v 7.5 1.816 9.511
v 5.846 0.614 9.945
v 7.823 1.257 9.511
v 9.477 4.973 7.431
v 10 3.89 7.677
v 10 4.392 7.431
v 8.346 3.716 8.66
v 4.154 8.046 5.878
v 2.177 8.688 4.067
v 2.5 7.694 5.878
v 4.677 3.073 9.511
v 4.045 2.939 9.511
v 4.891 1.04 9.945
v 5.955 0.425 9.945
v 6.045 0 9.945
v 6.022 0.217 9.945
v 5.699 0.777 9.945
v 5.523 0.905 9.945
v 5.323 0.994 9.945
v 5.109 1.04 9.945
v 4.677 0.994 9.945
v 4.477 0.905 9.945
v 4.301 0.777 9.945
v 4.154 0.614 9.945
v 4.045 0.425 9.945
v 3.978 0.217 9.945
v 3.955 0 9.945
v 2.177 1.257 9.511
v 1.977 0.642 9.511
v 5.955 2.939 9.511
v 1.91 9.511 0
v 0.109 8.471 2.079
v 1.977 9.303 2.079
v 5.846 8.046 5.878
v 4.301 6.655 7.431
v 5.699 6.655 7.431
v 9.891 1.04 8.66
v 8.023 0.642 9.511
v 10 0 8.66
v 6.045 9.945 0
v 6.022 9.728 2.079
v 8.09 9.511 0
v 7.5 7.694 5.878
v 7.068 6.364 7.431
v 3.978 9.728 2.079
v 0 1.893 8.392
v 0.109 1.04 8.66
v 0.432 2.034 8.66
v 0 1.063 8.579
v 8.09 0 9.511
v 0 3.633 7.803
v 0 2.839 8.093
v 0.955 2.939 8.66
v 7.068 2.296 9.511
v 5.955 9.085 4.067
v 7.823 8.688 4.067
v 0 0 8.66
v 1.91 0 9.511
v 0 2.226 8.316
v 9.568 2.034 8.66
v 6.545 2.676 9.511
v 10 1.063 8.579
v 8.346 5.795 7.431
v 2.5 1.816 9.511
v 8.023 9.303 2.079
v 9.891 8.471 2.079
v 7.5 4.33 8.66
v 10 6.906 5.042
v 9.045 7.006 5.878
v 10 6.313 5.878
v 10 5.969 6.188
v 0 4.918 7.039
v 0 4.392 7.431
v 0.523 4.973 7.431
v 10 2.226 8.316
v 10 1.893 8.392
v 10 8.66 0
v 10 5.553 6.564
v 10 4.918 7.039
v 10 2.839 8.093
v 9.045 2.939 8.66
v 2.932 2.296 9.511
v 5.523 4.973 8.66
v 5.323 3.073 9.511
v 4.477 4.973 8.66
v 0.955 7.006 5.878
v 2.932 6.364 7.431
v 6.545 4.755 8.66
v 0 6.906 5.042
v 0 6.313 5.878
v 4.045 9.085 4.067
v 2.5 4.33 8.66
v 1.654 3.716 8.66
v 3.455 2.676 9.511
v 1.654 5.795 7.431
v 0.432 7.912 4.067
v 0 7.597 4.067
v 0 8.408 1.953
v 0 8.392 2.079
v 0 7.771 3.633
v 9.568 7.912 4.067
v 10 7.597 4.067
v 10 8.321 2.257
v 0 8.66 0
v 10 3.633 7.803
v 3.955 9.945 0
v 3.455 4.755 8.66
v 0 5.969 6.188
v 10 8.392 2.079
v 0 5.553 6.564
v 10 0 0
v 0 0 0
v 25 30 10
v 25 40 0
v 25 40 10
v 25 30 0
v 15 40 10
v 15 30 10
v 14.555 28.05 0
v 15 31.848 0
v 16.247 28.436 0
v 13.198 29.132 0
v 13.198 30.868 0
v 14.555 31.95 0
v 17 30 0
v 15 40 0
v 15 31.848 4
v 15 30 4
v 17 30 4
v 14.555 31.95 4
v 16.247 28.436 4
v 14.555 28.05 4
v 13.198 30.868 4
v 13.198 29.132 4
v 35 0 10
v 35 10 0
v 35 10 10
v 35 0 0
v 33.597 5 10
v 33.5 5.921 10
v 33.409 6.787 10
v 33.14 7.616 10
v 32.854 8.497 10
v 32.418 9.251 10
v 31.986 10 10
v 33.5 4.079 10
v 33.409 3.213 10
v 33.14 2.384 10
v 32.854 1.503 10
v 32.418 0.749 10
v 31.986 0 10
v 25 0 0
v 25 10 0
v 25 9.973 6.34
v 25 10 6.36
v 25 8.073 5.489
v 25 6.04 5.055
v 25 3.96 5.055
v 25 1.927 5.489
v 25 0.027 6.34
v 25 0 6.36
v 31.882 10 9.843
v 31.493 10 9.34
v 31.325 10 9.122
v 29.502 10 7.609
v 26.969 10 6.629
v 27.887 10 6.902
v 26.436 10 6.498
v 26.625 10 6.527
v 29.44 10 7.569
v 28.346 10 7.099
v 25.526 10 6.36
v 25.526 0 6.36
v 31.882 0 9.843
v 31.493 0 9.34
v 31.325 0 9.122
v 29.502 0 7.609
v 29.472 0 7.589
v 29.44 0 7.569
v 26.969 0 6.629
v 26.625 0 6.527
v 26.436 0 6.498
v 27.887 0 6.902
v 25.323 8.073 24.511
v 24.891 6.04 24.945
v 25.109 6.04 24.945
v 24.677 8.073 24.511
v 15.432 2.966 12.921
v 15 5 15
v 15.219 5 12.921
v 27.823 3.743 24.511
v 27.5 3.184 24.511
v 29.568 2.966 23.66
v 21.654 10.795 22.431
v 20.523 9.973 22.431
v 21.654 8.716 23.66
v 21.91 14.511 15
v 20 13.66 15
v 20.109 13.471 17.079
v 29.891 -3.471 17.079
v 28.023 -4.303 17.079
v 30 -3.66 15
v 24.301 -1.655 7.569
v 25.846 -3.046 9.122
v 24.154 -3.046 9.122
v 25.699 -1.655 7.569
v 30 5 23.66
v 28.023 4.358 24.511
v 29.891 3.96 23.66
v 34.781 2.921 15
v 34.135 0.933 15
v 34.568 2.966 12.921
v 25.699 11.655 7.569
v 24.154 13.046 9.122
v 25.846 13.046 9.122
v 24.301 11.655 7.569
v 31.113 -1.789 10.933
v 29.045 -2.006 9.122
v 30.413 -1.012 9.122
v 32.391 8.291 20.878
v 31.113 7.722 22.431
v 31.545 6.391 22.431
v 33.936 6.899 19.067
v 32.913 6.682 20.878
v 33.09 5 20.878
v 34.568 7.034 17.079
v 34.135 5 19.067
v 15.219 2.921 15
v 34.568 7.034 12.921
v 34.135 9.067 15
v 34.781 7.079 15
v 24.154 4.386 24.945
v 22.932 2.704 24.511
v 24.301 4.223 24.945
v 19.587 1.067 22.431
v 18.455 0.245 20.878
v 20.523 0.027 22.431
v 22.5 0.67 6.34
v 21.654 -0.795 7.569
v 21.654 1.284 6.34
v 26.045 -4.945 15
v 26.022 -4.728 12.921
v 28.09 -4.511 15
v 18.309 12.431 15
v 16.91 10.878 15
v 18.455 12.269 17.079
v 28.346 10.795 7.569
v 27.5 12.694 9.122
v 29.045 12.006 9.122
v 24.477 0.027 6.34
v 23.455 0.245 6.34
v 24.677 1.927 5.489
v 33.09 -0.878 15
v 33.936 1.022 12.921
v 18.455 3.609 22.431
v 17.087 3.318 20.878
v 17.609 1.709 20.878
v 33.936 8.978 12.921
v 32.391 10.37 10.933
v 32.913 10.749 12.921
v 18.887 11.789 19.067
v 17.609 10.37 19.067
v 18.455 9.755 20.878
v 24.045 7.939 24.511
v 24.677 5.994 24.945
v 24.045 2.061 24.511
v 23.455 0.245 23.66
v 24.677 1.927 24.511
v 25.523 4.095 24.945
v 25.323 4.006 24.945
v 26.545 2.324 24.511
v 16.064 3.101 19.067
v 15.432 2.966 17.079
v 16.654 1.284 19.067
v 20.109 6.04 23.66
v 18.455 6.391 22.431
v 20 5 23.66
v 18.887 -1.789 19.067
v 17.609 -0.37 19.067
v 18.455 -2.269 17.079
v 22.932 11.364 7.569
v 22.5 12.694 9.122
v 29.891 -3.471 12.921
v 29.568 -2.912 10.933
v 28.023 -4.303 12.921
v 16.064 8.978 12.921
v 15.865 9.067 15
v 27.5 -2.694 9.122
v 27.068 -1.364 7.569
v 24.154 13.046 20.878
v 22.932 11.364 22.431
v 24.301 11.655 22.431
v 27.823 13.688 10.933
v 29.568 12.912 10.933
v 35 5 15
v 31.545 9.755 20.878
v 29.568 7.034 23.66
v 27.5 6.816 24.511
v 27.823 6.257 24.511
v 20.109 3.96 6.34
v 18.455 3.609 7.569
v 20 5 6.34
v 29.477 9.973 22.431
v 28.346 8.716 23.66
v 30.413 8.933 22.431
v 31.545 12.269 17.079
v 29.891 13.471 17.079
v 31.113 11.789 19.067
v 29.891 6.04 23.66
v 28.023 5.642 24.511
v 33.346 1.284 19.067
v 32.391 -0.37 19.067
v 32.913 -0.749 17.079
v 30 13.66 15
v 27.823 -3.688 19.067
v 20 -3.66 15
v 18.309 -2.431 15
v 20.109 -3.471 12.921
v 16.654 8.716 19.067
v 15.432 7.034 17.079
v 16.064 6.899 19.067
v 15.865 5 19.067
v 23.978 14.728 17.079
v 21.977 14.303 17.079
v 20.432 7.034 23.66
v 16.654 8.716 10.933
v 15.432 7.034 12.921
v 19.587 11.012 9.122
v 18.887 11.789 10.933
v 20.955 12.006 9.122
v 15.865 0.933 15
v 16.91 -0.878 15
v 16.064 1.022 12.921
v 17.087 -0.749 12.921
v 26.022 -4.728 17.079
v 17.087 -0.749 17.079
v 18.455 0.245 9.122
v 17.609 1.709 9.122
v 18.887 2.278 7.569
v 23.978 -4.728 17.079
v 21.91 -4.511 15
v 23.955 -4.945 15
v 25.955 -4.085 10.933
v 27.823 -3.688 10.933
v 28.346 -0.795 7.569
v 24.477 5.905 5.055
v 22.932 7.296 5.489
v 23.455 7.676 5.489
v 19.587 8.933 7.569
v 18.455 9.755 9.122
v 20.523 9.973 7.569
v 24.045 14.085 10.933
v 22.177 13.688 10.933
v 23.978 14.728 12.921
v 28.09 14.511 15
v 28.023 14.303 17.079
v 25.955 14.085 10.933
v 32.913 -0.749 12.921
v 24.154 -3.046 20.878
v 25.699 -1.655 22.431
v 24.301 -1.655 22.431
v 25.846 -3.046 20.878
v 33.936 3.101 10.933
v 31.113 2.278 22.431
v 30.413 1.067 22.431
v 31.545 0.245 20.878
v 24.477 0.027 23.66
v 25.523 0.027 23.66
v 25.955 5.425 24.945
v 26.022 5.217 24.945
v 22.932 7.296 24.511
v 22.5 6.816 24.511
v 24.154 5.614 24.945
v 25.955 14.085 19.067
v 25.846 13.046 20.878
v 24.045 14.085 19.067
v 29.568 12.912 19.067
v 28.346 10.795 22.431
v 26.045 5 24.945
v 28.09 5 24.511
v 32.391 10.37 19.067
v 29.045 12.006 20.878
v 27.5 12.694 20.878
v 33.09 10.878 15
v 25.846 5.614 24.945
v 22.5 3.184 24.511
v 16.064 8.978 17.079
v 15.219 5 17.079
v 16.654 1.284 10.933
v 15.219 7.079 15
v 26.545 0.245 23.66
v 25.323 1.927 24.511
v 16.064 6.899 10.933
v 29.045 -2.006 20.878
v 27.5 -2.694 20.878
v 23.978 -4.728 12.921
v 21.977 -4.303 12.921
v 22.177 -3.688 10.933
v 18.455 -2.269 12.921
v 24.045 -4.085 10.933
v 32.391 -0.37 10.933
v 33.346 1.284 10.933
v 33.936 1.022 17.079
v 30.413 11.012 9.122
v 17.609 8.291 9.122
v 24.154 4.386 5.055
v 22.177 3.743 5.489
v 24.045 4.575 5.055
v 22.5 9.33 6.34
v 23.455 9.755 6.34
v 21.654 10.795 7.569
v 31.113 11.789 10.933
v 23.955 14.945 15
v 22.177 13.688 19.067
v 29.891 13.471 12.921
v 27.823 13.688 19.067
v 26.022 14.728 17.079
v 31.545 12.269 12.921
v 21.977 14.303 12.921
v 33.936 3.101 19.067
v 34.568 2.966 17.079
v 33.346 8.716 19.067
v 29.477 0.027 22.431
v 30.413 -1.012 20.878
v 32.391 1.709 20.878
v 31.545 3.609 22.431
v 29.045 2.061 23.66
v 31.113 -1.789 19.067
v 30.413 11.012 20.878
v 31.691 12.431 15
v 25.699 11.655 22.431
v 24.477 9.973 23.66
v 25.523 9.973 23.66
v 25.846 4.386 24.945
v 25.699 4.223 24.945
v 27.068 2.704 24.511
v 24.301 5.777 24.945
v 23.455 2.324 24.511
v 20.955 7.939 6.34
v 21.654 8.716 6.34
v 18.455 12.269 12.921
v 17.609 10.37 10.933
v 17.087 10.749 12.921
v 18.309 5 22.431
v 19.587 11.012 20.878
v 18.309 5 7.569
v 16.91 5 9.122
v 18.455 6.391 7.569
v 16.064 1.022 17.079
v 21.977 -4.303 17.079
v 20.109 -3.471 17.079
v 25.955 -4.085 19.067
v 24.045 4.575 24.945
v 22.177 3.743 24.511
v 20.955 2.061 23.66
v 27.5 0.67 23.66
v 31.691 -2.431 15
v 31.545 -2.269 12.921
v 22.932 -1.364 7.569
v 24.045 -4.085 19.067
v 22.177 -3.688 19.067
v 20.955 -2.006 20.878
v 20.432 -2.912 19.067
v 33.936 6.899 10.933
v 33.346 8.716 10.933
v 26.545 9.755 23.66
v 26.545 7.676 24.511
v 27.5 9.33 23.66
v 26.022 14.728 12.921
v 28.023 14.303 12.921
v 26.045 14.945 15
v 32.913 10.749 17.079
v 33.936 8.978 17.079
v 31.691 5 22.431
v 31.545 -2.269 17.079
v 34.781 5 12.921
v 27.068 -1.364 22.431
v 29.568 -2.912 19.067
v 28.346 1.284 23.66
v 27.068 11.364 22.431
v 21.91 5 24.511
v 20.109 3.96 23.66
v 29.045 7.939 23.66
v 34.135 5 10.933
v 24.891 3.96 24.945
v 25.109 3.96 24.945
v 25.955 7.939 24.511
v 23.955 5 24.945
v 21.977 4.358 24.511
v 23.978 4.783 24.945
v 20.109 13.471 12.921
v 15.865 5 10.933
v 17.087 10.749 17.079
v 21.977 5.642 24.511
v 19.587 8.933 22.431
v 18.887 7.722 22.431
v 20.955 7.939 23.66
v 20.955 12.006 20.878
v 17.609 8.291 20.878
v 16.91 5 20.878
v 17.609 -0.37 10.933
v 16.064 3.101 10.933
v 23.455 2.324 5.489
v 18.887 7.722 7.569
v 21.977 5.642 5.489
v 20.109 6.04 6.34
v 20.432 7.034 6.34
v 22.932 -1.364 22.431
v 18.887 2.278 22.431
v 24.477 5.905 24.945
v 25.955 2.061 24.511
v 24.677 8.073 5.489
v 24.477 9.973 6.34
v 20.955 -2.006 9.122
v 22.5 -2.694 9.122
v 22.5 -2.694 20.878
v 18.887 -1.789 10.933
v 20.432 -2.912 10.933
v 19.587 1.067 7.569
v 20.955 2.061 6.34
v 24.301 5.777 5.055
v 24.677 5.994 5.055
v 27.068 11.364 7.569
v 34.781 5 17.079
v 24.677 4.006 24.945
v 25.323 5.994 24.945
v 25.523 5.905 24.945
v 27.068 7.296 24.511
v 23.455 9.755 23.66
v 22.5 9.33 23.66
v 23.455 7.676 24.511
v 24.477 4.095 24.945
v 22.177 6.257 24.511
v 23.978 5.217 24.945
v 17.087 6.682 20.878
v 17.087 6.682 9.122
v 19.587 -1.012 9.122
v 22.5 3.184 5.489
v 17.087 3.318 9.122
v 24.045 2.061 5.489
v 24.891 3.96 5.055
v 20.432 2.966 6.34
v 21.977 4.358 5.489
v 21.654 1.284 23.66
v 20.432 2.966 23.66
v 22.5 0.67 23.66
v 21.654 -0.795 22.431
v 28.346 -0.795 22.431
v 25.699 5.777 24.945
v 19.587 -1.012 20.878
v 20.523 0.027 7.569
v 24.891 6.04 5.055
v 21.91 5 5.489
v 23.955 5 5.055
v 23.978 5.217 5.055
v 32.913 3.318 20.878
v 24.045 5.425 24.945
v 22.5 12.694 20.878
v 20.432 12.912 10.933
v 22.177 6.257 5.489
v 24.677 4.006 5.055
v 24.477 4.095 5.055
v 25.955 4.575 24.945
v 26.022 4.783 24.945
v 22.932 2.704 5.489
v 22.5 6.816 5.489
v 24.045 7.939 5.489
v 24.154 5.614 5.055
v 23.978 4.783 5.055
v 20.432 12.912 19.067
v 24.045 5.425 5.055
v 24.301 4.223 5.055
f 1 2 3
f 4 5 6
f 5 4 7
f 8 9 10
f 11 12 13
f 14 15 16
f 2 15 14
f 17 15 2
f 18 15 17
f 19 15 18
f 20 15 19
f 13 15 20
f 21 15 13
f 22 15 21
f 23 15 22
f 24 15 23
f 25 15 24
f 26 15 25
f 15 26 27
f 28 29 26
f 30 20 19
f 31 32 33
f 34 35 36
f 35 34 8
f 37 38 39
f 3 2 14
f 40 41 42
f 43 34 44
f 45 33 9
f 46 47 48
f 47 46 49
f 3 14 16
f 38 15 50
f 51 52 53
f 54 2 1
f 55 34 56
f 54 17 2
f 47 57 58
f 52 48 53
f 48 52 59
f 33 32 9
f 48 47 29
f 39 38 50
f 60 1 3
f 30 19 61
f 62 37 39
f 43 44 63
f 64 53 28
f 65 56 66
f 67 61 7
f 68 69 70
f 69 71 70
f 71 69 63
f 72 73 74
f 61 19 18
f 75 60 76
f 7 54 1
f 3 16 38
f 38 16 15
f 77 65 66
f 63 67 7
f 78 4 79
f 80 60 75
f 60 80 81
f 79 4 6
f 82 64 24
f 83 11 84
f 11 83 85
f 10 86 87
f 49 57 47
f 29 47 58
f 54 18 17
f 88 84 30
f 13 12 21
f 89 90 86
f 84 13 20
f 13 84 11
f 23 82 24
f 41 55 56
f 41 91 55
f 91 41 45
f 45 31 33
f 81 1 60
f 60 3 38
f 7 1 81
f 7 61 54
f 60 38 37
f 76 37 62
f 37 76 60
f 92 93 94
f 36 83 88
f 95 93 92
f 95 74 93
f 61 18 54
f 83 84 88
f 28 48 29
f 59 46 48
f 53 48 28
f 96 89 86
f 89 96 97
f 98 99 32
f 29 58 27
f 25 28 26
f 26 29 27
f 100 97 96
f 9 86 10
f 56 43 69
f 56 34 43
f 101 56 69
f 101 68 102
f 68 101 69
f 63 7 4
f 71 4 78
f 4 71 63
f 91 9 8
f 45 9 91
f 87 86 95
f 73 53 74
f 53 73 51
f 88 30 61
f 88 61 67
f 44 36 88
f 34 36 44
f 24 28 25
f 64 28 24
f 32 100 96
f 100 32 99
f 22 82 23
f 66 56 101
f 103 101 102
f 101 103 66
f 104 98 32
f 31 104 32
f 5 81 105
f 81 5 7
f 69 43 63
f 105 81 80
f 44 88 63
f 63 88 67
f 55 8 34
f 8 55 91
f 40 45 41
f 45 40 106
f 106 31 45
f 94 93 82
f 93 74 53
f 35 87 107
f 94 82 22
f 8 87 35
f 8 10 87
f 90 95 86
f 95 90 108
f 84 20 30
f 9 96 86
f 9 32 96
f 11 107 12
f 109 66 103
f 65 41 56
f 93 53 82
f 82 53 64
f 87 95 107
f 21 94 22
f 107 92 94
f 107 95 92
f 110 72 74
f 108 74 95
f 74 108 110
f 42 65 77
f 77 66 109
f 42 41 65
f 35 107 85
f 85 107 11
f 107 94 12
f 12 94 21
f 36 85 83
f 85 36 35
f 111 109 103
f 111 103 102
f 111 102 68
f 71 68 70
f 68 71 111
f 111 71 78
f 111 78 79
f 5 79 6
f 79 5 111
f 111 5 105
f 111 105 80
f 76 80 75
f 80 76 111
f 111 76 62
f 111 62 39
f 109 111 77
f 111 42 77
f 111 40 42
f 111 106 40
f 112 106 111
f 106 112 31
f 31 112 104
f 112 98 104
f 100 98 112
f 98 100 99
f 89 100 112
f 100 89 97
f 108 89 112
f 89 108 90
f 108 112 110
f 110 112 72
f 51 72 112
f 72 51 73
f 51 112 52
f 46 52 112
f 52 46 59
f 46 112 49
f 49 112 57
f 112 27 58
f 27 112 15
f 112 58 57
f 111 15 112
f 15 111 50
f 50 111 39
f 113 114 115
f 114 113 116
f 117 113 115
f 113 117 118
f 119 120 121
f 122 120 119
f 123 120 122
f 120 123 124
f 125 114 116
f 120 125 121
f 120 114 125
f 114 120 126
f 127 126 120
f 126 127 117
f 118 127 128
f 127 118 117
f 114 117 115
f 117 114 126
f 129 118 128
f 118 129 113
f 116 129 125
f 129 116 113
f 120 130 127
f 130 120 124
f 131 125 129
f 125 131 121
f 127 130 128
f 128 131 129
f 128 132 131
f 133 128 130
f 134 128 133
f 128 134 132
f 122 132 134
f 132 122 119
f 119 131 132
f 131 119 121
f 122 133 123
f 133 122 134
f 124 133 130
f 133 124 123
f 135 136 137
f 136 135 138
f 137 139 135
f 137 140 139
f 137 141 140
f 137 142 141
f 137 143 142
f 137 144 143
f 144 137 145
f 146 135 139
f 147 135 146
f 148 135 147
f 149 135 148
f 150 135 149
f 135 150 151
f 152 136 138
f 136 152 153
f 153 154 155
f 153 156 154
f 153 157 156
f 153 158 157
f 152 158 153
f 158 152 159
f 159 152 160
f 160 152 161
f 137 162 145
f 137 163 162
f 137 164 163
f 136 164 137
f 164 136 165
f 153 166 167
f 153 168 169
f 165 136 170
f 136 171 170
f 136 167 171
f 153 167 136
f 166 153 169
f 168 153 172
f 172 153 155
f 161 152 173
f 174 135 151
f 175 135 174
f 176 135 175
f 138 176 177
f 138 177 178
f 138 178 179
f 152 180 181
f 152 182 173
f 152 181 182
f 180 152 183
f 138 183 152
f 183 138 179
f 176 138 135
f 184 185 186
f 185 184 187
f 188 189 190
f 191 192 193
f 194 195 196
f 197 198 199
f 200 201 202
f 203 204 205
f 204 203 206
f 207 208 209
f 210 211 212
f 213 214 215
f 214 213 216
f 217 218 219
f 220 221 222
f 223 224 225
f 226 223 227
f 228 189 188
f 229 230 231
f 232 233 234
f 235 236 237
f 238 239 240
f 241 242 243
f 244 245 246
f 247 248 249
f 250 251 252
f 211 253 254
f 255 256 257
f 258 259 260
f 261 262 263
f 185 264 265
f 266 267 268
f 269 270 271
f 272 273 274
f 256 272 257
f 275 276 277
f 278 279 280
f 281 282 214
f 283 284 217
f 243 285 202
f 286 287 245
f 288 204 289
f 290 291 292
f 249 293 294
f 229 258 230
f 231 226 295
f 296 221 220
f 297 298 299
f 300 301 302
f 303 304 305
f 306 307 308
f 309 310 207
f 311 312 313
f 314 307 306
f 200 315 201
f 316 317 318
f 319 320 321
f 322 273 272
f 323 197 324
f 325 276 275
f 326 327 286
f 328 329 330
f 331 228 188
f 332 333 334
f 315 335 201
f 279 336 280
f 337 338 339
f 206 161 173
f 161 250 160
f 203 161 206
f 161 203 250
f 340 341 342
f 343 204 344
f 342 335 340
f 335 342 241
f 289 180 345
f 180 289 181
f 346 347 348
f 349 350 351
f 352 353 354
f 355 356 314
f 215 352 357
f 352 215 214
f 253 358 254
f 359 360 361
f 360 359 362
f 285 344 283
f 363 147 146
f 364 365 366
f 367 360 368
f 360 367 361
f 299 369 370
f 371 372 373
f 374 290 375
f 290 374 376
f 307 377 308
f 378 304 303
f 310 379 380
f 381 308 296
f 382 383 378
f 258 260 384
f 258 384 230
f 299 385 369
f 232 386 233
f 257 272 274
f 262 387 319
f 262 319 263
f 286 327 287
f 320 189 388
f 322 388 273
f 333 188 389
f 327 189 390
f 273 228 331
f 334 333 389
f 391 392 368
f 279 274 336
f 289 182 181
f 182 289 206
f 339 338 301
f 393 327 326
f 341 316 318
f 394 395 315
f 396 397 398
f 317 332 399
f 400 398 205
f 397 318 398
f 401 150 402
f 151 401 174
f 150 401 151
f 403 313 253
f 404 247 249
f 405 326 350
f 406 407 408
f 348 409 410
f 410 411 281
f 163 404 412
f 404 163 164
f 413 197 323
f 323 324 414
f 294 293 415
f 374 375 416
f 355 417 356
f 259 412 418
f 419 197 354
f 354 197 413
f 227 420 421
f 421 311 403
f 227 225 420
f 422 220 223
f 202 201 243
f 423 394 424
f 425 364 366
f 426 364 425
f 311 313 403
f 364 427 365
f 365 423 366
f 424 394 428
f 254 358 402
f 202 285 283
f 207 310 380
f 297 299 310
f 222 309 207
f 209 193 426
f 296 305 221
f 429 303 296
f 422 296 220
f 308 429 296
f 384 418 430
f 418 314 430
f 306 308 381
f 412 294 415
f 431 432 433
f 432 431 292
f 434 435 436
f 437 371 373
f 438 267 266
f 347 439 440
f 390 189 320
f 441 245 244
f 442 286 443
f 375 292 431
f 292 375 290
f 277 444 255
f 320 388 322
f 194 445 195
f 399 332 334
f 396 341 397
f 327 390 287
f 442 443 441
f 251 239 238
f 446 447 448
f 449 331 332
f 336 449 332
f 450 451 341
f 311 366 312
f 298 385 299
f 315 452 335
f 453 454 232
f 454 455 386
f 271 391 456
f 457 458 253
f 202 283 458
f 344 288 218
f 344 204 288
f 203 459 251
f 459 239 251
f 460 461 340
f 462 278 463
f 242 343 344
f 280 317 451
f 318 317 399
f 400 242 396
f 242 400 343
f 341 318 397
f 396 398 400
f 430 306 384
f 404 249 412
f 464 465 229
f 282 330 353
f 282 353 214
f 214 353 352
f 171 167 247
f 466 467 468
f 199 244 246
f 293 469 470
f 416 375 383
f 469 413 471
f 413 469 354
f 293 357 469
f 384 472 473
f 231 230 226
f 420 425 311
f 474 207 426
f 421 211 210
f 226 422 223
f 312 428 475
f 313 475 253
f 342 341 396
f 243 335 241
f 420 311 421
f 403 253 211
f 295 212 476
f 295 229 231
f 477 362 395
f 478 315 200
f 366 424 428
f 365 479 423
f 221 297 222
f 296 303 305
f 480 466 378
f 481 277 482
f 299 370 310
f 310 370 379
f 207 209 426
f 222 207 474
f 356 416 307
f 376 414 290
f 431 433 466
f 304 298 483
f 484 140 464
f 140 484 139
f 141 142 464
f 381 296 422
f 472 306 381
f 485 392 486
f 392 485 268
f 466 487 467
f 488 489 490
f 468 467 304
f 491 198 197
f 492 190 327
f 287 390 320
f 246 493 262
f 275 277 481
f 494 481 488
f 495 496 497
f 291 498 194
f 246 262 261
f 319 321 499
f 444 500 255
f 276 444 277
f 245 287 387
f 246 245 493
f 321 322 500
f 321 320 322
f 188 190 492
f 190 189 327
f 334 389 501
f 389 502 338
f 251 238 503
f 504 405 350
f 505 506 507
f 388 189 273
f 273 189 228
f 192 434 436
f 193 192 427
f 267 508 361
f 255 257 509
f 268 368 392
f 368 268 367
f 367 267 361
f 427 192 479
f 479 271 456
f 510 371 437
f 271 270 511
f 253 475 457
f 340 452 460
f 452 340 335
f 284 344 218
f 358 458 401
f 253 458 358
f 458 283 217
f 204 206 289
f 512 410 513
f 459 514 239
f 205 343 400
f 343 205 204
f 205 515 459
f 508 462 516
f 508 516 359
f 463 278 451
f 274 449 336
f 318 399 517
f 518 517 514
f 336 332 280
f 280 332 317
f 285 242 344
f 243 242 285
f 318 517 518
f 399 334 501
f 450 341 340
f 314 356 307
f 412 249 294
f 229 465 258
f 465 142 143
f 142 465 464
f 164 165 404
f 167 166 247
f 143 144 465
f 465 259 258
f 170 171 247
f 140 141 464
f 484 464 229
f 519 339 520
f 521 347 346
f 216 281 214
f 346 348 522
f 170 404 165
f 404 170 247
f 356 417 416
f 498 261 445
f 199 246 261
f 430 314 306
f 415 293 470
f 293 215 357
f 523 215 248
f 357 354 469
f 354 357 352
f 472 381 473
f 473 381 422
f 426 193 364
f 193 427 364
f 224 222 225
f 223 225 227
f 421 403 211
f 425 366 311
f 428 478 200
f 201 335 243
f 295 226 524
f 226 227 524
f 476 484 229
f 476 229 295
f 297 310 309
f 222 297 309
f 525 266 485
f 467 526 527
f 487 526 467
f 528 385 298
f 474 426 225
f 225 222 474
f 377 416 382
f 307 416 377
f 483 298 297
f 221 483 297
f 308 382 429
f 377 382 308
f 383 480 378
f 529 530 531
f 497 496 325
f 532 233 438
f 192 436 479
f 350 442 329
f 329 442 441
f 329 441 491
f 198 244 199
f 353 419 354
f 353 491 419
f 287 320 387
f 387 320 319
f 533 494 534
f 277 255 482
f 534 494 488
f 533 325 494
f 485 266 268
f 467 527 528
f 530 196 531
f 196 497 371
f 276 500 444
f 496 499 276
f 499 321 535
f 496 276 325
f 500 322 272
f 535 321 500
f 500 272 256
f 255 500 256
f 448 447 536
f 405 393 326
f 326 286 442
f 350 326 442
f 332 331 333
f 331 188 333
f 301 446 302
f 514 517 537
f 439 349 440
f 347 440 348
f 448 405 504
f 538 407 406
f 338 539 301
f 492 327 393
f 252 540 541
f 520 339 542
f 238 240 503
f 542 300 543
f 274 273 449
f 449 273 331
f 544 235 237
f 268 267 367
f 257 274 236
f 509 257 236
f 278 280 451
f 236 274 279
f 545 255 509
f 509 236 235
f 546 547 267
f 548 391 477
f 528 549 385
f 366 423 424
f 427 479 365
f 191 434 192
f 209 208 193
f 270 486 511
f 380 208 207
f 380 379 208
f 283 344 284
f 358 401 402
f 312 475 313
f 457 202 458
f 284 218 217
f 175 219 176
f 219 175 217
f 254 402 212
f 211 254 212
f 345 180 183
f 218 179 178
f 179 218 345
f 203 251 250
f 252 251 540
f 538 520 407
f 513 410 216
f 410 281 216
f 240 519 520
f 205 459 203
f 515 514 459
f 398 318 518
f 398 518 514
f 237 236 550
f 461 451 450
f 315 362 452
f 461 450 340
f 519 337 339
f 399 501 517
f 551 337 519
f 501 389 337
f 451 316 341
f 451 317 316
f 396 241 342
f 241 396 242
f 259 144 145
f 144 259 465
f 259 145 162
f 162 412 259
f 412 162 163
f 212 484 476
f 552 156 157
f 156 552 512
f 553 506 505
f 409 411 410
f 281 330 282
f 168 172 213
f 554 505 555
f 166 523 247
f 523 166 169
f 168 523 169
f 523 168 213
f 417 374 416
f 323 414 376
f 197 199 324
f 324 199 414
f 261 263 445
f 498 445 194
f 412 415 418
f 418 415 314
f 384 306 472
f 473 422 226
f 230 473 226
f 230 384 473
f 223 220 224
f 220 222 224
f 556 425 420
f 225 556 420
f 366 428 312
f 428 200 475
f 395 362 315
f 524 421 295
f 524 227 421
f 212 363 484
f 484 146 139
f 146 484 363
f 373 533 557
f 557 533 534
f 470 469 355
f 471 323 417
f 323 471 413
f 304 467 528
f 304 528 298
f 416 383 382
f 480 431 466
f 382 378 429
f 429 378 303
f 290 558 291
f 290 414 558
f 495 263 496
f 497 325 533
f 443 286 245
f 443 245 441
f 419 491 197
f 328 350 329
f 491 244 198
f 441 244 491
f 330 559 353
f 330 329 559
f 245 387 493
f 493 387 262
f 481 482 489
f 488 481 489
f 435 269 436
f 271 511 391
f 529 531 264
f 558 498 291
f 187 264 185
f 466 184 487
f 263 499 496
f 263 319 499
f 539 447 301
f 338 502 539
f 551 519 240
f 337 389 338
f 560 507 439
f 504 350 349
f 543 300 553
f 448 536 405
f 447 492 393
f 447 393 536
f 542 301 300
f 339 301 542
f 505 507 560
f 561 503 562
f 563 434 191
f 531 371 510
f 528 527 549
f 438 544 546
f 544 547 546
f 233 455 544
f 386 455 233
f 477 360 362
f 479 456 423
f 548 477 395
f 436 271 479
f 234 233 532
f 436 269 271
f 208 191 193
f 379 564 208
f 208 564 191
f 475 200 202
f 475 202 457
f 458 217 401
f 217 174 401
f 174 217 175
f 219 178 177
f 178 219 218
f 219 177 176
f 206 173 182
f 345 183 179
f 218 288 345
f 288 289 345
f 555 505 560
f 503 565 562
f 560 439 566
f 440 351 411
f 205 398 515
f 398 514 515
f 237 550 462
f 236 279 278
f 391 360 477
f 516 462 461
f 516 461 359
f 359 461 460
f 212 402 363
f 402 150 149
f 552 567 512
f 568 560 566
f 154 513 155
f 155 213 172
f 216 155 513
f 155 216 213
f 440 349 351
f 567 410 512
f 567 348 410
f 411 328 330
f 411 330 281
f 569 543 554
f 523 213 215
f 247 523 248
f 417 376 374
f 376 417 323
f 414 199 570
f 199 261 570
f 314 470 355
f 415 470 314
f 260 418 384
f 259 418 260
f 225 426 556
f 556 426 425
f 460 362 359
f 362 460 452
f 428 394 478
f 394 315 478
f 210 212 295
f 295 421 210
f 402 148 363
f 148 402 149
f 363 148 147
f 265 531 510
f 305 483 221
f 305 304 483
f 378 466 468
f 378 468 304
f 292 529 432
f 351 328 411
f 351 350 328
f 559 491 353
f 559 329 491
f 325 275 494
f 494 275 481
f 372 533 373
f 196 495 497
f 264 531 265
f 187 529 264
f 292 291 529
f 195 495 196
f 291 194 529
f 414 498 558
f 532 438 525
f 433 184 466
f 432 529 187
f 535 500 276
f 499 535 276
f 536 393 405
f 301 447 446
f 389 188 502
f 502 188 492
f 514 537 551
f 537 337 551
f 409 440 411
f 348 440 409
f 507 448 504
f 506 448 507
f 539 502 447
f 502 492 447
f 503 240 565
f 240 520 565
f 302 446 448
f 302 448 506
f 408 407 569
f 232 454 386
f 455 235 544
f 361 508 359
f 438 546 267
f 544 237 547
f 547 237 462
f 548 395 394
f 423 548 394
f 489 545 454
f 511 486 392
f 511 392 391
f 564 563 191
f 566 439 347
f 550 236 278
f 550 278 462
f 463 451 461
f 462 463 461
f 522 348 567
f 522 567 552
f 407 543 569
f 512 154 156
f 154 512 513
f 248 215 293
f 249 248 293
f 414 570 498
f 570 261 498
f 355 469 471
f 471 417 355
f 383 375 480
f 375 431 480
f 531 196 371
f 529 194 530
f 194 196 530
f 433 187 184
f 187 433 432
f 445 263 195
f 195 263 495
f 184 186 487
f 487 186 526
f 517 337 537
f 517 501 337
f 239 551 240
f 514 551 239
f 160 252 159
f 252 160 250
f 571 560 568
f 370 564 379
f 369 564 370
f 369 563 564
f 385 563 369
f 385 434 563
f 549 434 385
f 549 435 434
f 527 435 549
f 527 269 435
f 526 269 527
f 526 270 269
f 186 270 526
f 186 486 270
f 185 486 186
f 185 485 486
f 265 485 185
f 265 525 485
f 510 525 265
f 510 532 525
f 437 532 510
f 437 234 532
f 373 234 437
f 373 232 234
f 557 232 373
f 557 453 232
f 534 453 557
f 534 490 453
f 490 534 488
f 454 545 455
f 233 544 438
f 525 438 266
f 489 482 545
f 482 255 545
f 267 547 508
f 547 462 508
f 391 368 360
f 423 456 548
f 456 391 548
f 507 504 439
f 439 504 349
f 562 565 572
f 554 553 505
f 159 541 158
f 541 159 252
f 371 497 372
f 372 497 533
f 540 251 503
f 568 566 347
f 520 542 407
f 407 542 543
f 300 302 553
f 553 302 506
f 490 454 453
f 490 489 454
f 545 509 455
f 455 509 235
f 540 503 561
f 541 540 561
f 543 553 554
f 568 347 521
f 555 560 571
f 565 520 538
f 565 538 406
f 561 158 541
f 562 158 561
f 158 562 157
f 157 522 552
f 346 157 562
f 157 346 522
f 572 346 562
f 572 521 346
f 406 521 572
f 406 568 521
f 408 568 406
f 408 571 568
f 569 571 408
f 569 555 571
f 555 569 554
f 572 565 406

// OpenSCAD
//default at position [0,0,0]
//left to right
Xpos = 15; //[-4:4]
// bottom to top
Zpos = 0; //[-16:4]

//default logo scaling [5]
logo_size = 5;

intersection(){
translate([5,0,0]){
color("salmon");
sphere(r=10, center=true);
}
scale([logo_size,logo_size,logo_size]){
cube(2);}
}
echo ("check");
union(){
translate([15,30,0]){
scale([5,5,5]){
color("red")
cube(2,2,2);
  }

 }
 translate([Xpos,30,Zpos]){
    cylinder(r=2, h=4);
  }
}
translate([25,0,0]){
scale([5,5,5]){
color("red")
cube(2,2,2);
  }
}

translate([25,5,15]){
color("red");
sphere(r=10, center=true);
}
